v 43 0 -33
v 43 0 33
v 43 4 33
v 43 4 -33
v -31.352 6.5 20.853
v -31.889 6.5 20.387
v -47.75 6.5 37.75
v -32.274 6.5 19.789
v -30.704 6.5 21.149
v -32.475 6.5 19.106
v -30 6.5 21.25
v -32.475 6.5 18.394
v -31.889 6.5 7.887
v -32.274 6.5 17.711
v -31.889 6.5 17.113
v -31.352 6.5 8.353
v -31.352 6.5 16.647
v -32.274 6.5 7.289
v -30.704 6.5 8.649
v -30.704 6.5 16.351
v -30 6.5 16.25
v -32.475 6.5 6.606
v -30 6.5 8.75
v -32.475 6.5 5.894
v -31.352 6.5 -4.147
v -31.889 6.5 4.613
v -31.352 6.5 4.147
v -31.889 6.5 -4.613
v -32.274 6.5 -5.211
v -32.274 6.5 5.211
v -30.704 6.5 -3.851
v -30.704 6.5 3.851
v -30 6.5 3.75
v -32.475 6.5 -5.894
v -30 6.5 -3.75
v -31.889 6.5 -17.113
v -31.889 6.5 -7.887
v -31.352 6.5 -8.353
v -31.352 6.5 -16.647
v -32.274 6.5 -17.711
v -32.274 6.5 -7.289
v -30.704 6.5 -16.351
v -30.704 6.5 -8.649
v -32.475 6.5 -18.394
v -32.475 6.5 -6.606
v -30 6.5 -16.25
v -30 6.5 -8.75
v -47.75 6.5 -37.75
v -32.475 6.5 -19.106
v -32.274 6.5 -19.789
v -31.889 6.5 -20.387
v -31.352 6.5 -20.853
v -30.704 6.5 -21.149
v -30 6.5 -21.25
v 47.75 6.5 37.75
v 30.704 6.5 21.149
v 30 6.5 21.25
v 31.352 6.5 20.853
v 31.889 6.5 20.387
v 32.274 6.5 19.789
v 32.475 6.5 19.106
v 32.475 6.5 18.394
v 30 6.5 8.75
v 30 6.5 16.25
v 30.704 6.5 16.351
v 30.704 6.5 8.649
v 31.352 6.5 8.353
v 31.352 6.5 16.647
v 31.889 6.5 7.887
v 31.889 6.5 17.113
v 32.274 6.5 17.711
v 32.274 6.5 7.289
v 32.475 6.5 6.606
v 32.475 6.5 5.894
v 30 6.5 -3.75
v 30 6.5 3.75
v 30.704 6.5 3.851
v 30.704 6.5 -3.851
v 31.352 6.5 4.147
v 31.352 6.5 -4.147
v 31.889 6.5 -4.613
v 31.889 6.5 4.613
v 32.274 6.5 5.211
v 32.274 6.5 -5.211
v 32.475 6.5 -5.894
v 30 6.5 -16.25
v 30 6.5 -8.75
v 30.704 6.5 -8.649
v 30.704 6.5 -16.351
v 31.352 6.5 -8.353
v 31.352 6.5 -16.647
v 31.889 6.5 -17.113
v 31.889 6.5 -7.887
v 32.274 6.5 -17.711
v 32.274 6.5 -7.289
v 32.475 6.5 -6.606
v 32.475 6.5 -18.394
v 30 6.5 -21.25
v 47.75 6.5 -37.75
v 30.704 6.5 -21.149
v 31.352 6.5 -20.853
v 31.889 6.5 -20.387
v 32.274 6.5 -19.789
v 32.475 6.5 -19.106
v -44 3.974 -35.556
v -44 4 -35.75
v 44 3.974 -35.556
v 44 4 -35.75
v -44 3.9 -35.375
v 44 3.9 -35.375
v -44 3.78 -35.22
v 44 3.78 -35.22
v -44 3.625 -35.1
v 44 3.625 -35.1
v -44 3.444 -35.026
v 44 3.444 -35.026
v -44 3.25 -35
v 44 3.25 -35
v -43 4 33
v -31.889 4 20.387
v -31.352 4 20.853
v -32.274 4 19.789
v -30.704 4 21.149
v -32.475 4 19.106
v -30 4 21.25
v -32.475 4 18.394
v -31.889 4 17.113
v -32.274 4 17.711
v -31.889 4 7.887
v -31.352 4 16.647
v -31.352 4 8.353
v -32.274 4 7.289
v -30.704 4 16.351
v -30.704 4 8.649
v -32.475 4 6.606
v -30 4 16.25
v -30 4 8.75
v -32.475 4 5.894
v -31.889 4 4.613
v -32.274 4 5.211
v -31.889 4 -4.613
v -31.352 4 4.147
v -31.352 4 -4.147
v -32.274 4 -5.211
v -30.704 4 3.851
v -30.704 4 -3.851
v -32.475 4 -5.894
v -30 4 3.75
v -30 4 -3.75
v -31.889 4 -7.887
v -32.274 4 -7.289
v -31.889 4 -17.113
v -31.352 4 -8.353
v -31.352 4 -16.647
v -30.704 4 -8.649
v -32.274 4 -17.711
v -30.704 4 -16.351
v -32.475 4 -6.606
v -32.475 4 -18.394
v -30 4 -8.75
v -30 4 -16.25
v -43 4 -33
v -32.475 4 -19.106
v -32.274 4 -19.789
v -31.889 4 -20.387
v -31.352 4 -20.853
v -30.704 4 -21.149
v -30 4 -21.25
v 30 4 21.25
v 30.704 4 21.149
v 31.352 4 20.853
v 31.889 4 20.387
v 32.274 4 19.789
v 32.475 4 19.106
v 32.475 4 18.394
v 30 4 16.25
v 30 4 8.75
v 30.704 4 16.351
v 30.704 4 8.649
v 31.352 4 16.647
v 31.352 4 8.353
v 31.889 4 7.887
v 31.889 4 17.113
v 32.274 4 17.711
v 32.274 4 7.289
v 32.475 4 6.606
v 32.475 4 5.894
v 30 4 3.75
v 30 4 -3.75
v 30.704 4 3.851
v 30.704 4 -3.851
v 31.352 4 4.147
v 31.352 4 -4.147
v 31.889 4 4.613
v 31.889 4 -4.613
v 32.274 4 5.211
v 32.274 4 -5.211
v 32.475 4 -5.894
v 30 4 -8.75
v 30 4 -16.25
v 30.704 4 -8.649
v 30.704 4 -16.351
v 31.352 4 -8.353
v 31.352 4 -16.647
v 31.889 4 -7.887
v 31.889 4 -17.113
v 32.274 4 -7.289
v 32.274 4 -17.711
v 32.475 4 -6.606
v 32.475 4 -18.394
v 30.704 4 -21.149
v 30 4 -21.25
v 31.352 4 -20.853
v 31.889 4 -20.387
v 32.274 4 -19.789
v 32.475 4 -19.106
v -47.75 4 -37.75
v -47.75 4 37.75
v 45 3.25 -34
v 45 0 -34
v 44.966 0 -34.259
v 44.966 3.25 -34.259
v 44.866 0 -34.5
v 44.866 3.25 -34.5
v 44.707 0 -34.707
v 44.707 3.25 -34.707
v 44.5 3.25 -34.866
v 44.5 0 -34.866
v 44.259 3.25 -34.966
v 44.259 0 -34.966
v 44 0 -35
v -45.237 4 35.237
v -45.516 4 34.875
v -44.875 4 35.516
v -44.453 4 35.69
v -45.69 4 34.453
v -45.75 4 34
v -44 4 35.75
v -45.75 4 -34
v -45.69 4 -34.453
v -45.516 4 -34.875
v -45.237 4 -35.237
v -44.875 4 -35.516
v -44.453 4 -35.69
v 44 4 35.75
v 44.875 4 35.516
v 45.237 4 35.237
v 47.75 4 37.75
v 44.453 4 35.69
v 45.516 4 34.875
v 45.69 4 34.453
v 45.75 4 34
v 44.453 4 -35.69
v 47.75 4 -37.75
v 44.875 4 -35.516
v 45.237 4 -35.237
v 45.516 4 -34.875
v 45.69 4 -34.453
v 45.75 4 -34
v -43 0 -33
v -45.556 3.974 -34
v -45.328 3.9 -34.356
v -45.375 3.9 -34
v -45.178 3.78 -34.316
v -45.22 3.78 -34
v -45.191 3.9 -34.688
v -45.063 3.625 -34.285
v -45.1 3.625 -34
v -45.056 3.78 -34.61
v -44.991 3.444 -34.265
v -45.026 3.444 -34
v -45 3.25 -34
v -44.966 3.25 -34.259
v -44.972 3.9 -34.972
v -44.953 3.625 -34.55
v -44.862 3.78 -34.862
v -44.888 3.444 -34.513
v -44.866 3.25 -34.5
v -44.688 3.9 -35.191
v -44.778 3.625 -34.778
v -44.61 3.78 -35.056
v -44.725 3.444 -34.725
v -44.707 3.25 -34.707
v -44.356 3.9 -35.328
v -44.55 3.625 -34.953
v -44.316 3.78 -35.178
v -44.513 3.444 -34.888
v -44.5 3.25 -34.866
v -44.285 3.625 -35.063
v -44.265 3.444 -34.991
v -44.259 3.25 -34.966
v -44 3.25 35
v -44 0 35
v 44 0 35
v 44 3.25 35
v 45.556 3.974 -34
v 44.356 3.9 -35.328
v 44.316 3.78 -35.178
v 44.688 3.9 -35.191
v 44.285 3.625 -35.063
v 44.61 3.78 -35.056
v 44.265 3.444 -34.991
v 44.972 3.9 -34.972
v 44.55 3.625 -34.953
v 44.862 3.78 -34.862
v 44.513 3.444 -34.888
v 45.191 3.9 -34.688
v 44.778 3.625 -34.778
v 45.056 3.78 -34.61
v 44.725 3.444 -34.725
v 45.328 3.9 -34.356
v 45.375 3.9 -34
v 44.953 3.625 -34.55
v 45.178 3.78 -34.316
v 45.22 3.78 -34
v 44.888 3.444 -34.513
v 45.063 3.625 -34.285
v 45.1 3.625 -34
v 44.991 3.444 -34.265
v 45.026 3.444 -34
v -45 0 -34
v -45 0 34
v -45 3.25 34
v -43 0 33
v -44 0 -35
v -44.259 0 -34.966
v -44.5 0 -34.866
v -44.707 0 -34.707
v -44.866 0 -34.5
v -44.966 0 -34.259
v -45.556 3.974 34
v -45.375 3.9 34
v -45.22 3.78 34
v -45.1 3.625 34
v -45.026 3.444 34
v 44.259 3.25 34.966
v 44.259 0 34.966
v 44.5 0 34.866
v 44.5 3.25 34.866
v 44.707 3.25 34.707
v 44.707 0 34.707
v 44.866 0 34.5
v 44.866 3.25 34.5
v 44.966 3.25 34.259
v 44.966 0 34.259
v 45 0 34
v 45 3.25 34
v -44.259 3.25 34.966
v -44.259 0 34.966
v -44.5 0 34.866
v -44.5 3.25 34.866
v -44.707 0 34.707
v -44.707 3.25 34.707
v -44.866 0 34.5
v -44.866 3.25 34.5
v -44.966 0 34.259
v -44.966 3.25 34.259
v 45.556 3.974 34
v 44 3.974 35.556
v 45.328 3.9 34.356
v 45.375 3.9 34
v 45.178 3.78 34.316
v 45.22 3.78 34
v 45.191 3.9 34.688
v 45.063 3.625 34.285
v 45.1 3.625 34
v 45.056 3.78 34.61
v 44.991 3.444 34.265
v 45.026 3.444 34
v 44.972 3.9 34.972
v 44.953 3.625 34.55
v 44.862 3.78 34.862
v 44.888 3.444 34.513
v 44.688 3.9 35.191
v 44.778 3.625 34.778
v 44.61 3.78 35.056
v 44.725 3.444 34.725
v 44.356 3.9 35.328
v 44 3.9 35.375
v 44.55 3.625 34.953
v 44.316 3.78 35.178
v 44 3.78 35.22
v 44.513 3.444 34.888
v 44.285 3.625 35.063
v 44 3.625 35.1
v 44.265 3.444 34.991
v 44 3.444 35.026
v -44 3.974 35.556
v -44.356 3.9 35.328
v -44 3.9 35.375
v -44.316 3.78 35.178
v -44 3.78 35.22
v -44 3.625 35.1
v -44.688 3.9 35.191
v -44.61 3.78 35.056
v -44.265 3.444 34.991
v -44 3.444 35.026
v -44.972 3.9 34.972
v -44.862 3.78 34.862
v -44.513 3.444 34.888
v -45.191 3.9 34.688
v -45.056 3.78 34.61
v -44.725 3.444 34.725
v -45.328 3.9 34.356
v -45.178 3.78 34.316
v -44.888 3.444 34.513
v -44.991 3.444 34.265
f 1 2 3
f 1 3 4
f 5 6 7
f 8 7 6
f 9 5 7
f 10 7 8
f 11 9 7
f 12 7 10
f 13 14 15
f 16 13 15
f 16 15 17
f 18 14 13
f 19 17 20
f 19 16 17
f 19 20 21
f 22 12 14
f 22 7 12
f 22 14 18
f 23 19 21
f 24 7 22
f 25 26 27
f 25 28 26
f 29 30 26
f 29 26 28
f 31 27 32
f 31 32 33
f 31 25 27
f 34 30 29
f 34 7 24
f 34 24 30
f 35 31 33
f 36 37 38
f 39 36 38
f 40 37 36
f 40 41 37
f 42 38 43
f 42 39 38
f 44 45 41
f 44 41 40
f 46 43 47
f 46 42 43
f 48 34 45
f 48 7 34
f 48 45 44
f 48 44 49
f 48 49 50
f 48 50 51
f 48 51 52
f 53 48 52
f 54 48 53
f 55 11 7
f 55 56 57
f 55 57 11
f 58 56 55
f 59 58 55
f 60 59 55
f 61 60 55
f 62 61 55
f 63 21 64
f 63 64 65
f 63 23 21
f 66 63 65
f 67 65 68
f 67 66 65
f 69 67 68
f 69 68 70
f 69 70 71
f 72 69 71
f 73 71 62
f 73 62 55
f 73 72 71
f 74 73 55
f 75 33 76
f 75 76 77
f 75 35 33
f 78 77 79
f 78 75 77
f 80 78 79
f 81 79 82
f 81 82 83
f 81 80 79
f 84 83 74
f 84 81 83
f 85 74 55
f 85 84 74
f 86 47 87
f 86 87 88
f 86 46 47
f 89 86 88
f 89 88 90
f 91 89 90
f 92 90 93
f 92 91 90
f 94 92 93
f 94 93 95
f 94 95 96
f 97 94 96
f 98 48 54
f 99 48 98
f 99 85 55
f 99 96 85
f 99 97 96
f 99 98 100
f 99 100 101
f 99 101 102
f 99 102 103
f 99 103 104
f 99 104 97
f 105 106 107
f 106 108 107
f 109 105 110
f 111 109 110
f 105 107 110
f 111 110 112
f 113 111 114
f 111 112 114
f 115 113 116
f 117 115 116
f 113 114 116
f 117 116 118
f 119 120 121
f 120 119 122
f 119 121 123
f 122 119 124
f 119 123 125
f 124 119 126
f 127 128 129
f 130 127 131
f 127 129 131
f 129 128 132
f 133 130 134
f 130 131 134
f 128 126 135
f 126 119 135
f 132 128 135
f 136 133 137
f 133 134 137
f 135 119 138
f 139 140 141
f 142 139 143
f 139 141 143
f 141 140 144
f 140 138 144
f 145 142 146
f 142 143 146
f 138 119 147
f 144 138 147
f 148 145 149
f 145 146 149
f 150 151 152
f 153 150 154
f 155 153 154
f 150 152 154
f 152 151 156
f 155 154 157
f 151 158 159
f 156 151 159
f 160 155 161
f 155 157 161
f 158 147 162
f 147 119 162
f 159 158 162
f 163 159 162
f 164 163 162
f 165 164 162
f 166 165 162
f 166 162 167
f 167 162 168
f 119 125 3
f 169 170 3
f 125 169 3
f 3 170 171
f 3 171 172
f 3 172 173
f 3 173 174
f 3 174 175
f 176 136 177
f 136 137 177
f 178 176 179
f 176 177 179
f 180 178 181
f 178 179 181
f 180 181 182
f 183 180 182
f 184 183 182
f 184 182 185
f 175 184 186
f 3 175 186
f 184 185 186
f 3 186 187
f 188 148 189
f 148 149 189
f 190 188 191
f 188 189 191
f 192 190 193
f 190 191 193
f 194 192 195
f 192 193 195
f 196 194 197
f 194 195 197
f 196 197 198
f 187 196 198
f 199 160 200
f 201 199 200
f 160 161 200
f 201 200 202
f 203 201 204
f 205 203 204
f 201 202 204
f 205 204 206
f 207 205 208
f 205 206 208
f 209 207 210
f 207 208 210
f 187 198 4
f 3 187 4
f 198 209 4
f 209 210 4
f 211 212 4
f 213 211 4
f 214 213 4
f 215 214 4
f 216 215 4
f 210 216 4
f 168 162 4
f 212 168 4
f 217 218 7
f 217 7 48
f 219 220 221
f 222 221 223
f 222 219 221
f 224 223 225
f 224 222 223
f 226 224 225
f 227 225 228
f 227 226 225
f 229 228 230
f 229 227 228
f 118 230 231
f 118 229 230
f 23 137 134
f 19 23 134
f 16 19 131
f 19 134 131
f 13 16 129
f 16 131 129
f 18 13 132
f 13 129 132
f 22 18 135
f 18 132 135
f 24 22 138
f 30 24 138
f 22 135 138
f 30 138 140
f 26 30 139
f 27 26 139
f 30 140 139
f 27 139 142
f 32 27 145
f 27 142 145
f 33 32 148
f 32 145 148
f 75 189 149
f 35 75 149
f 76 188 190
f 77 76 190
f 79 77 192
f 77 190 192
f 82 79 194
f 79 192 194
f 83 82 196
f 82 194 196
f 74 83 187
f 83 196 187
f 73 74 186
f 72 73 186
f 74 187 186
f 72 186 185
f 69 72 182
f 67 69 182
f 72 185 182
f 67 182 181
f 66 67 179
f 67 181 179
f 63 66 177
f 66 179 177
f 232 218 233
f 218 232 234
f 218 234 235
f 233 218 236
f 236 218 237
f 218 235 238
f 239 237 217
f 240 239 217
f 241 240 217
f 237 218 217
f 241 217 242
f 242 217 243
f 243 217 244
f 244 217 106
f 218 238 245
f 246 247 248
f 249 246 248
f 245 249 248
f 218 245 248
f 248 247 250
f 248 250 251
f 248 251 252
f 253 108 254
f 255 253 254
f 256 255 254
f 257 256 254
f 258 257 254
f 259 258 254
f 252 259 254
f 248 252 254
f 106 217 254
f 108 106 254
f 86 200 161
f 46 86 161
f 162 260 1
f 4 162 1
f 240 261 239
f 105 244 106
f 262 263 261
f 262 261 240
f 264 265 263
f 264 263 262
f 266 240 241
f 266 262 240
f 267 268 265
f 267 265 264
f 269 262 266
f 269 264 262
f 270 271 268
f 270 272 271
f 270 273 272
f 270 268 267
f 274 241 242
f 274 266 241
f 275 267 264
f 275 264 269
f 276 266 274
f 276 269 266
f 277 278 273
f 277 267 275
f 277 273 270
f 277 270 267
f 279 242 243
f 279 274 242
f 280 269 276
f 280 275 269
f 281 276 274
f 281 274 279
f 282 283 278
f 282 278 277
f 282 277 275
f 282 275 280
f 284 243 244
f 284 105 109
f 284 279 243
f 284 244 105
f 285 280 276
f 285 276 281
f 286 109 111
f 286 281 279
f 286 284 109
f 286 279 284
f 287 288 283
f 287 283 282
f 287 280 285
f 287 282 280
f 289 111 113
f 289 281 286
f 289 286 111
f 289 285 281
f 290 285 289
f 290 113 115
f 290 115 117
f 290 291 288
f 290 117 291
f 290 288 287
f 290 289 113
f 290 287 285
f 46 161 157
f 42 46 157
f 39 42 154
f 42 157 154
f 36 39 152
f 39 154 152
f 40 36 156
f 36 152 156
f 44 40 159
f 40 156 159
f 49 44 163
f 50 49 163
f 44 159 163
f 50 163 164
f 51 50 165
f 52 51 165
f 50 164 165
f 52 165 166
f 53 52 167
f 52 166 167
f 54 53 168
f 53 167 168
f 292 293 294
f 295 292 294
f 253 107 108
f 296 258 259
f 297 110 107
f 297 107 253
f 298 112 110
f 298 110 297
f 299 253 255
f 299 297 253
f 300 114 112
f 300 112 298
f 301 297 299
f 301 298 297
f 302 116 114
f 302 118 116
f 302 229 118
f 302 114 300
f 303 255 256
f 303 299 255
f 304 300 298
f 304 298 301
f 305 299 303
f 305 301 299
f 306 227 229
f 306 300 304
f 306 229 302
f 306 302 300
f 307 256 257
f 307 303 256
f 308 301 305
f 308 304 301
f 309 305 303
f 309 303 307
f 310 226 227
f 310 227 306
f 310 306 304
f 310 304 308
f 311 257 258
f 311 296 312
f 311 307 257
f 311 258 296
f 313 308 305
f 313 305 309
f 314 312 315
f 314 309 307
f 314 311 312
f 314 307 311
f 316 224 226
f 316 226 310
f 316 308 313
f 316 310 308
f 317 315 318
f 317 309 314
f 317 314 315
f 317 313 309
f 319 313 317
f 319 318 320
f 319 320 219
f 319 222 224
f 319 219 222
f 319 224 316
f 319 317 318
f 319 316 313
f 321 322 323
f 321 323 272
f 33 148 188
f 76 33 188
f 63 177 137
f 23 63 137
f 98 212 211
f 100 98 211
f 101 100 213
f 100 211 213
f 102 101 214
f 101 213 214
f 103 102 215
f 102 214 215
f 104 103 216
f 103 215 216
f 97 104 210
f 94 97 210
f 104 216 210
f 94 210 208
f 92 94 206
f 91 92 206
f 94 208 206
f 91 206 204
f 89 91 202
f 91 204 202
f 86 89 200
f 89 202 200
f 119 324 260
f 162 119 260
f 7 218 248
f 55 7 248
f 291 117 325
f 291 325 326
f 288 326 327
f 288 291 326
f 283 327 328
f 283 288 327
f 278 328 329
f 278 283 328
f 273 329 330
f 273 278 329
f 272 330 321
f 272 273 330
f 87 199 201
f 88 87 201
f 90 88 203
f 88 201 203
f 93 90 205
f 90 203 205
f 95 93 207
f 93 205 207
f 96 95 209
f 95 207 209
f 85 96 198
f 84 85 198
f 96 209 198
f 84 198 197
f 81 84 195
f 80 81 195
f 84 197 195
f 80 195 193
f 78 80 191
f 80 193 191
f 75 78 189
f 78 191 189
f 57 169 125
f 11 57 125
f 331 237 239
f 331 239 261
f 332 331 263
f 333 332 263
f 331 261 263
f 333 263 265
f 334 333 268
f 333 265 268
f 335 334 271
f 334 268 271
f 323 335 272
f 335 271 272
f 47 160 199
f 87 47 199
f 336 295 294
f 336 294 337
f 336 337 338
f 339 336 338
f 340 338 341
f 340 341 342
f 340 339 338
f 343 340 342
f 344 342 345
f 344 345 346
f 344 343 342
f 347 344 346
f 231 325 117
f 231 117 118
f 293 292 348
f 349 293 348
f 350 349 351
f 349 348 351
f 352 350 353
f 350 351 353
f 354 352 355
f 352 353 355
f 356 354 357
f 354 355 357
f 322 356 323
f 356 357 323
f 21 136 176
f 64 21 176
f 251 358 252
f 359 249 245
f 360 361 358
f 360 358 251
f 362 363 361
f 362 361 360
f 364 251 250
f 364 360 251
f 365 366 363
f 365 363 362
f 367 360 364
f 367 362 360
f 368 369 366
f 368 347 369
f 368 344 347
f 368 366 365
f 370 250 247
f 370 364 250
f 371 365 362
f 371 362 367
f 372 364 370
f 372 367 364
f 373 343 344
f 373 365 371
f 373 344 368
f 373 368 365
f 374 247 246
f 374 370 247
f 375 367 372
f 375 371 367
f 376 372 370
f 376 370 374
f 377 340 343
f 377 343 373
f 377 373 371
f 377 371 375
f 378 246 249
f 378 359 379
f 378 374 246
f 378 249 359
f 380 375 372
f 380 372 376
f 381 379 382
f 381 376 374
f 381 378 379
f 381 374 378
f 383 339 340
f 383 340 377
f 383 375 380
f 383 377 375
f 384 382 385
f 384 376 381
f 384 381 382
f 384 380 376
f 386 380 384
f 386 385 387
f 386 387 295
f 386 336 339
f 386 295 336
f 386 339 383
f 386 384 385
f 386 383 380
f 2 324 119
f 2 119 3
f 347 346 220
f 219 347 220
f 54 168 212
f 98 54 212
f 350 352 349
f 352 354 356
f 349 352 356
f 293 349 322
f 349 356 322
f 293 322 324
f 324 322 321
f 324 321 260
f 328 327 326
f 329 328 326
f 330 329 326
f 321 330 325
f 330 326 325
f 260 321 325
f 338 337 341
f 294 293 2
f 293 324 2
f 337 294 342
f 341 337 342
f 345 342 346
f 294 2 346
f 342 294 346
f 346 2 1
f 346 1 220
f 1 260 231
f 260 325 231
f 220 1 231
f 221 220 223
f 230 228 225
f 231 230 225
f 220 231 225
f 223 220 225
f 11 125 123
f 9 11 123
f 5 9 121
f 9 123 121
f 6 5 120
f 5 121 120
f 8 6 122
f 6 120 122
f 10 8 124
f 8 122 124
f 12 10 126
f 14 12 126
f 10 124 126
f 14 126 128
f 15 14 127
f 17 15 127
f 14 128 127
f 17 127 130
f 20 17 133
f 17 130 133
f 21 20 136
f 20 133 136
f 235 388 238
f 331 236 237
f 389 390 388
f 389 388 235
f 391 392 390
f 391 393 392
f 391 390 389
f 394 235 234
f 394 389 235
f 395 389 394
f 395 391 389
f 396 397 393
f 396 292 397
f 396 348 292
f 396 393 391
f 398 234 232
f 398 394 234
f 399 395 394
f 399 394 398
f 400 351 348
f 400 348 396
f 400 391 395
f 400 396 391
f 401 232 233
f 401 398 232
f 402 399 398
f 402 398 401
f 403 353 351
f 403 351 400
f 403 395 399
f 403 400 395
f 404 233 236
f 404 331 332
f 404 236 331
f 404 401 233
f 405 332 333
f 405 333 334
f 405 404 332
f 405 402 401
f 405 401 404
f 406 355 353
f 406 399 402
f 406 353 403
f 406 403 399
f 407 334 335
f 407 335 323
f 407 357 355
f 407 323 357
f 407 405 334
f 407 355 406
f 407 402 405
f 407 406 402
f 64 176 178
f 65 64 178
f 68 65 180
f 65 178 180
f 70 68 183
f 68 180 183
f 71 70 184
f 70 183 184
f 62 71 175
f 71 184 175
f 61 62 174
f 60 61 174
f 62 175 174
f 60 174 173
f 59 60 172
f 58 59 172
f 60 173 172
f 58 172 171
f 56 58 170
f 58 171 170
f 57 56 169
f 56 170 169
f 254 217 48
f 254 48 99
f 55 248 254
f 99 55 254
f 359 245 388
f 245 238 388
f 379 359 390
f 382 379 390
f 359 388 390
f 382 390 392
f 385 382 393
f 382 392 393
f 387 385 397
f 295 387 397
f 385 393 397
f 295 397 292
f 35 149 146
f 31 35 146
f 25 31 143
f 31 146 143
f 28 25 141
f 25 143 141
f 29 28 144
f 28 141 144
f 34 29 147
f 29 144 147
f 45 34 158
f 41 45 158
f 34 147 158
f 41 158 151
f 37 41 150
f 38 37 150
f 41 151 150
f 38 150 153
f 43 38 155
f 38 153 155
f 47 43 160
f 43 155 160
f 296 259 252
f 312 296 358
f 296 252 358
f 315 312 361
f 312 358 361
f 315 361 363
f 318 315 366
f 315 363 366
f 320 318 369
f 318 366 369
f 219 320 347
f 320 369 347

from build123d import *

# Parameters (mm, degrees)
SKETCH1_W           = 90
SKETCH1_H           = 70
SKETCH1_W_2         = 86
SKETCH1_H_2         = 66
EXTRUDE_THIN1_DEPTH = 4
SKETCH2_W           = 95.5
SKETCH2_H           = 75.5
BOSS_EXTRUDE1_DEPTH = 2.5
FILLET1_R           = 1
FILLET2_R           = 0.75


with BuildPart() as part:
    # Sketch1 → Extrude-Thin1 (new body)
    with BuildSketch(Plane(origin=(0, 0, 0), x_dir=(1, 0, 0), z_dir=(0, 1, 0))):
        Rectangle(SKETCH1_W, SKETCH1_H)
        Rectangle(SKETCH1_W_2, SKETCH1_H_2, mode=Mode.SUBTRACT)
    extrude(amount=EXTRUDE_THIN1_DEPTH)

    # Sketch2 → Boss-Extrude1 (add)
    with BuildSketch(Plane(origin=(0, 4, 0), x_dir=(1, 0, 0), z_dir=(0, 1, 0))):
        Rectangle(SKETCH2_W, SKETCH2_H)
        with BuildLine():
            Line((-30, -16.25), (30, -16.25))
            ThreePointArc((30, -16.25), (32.5, -18.75), (30, -21.25))
            Line((30, -21.25), (-30, -21.25))
            ThreePointArc((-30, -21.25), (-32.5, -18.75), (-30, -16.25))
        make_face(mode=Mode.SUBTRACT)
        with BuildLine():
            Line((-30, -3.75), (30, -3.75))
            ThreePointArc((30, -3.75), (32.5, -6.25), (30, -8.75))
            Line((30, -8.75), (-30, -8.75))
            ThreePointArc((-30, -8.75), (-32.5, -6.25), (-30, -3.75))
        make_face(mode=Mode.SUBTRACT)
        with BuildLine():
            Line((-30, 8.75), (30, 8.75))
            ThreePointArc((30, 8.75), (32.5, 6.25), (30, 3.75))
            Line((30, 3.75), (-30, 3.75))
            ThreePointArc((-30, 3.75), (-32.5, 6.25), (-30, 8.75))
        make_face(mode=Mode.SUBTRACT)
        with BuildLine():
            Line((-30, 21.25), (30, 21.25))
            ThreePointArc((30, 21.25), (32.5, 18.75), (30, 16.25))
            Line((30, 16.25), (-30, 16.25))
            ThreePointArc((-30, 16.25), (-32.5, 18.75), (-30, 21.25))
        make_face(mode=Mode.SUBTRACT)
    extrude(amount=BOSS_EXTRUDE1_DEPTH)

    # Fillet1
    fillet1_edges = [part.edges().sort_by_distance(p)[0] for p in [
        (45, 2, 35),
        (-45, 2, 35),
        (-45, 2, -35),
        (45, 2, -35),
    ]]
    fillet(fillet1_edges, radius=FILLET1_R)

    # Fillet2
    fillet2_edges = [part.edges().sort_by_distance(p)[0] for p in [
        (-45, 4, 0),
        (0, 4, -35),
        (45, 4, 0),
        (0, 4, 35),
        (-44.707106781, 4, -34.707106781),
        (44.707106781, 4, -34.707106781),
        (-44.707106781, 4, 34.707106781),
        (44.707106781, 4, 34.707106781),
    ]]
    fillet(fillet2_edges, radius=FILLET2_R)


solid = part.part
